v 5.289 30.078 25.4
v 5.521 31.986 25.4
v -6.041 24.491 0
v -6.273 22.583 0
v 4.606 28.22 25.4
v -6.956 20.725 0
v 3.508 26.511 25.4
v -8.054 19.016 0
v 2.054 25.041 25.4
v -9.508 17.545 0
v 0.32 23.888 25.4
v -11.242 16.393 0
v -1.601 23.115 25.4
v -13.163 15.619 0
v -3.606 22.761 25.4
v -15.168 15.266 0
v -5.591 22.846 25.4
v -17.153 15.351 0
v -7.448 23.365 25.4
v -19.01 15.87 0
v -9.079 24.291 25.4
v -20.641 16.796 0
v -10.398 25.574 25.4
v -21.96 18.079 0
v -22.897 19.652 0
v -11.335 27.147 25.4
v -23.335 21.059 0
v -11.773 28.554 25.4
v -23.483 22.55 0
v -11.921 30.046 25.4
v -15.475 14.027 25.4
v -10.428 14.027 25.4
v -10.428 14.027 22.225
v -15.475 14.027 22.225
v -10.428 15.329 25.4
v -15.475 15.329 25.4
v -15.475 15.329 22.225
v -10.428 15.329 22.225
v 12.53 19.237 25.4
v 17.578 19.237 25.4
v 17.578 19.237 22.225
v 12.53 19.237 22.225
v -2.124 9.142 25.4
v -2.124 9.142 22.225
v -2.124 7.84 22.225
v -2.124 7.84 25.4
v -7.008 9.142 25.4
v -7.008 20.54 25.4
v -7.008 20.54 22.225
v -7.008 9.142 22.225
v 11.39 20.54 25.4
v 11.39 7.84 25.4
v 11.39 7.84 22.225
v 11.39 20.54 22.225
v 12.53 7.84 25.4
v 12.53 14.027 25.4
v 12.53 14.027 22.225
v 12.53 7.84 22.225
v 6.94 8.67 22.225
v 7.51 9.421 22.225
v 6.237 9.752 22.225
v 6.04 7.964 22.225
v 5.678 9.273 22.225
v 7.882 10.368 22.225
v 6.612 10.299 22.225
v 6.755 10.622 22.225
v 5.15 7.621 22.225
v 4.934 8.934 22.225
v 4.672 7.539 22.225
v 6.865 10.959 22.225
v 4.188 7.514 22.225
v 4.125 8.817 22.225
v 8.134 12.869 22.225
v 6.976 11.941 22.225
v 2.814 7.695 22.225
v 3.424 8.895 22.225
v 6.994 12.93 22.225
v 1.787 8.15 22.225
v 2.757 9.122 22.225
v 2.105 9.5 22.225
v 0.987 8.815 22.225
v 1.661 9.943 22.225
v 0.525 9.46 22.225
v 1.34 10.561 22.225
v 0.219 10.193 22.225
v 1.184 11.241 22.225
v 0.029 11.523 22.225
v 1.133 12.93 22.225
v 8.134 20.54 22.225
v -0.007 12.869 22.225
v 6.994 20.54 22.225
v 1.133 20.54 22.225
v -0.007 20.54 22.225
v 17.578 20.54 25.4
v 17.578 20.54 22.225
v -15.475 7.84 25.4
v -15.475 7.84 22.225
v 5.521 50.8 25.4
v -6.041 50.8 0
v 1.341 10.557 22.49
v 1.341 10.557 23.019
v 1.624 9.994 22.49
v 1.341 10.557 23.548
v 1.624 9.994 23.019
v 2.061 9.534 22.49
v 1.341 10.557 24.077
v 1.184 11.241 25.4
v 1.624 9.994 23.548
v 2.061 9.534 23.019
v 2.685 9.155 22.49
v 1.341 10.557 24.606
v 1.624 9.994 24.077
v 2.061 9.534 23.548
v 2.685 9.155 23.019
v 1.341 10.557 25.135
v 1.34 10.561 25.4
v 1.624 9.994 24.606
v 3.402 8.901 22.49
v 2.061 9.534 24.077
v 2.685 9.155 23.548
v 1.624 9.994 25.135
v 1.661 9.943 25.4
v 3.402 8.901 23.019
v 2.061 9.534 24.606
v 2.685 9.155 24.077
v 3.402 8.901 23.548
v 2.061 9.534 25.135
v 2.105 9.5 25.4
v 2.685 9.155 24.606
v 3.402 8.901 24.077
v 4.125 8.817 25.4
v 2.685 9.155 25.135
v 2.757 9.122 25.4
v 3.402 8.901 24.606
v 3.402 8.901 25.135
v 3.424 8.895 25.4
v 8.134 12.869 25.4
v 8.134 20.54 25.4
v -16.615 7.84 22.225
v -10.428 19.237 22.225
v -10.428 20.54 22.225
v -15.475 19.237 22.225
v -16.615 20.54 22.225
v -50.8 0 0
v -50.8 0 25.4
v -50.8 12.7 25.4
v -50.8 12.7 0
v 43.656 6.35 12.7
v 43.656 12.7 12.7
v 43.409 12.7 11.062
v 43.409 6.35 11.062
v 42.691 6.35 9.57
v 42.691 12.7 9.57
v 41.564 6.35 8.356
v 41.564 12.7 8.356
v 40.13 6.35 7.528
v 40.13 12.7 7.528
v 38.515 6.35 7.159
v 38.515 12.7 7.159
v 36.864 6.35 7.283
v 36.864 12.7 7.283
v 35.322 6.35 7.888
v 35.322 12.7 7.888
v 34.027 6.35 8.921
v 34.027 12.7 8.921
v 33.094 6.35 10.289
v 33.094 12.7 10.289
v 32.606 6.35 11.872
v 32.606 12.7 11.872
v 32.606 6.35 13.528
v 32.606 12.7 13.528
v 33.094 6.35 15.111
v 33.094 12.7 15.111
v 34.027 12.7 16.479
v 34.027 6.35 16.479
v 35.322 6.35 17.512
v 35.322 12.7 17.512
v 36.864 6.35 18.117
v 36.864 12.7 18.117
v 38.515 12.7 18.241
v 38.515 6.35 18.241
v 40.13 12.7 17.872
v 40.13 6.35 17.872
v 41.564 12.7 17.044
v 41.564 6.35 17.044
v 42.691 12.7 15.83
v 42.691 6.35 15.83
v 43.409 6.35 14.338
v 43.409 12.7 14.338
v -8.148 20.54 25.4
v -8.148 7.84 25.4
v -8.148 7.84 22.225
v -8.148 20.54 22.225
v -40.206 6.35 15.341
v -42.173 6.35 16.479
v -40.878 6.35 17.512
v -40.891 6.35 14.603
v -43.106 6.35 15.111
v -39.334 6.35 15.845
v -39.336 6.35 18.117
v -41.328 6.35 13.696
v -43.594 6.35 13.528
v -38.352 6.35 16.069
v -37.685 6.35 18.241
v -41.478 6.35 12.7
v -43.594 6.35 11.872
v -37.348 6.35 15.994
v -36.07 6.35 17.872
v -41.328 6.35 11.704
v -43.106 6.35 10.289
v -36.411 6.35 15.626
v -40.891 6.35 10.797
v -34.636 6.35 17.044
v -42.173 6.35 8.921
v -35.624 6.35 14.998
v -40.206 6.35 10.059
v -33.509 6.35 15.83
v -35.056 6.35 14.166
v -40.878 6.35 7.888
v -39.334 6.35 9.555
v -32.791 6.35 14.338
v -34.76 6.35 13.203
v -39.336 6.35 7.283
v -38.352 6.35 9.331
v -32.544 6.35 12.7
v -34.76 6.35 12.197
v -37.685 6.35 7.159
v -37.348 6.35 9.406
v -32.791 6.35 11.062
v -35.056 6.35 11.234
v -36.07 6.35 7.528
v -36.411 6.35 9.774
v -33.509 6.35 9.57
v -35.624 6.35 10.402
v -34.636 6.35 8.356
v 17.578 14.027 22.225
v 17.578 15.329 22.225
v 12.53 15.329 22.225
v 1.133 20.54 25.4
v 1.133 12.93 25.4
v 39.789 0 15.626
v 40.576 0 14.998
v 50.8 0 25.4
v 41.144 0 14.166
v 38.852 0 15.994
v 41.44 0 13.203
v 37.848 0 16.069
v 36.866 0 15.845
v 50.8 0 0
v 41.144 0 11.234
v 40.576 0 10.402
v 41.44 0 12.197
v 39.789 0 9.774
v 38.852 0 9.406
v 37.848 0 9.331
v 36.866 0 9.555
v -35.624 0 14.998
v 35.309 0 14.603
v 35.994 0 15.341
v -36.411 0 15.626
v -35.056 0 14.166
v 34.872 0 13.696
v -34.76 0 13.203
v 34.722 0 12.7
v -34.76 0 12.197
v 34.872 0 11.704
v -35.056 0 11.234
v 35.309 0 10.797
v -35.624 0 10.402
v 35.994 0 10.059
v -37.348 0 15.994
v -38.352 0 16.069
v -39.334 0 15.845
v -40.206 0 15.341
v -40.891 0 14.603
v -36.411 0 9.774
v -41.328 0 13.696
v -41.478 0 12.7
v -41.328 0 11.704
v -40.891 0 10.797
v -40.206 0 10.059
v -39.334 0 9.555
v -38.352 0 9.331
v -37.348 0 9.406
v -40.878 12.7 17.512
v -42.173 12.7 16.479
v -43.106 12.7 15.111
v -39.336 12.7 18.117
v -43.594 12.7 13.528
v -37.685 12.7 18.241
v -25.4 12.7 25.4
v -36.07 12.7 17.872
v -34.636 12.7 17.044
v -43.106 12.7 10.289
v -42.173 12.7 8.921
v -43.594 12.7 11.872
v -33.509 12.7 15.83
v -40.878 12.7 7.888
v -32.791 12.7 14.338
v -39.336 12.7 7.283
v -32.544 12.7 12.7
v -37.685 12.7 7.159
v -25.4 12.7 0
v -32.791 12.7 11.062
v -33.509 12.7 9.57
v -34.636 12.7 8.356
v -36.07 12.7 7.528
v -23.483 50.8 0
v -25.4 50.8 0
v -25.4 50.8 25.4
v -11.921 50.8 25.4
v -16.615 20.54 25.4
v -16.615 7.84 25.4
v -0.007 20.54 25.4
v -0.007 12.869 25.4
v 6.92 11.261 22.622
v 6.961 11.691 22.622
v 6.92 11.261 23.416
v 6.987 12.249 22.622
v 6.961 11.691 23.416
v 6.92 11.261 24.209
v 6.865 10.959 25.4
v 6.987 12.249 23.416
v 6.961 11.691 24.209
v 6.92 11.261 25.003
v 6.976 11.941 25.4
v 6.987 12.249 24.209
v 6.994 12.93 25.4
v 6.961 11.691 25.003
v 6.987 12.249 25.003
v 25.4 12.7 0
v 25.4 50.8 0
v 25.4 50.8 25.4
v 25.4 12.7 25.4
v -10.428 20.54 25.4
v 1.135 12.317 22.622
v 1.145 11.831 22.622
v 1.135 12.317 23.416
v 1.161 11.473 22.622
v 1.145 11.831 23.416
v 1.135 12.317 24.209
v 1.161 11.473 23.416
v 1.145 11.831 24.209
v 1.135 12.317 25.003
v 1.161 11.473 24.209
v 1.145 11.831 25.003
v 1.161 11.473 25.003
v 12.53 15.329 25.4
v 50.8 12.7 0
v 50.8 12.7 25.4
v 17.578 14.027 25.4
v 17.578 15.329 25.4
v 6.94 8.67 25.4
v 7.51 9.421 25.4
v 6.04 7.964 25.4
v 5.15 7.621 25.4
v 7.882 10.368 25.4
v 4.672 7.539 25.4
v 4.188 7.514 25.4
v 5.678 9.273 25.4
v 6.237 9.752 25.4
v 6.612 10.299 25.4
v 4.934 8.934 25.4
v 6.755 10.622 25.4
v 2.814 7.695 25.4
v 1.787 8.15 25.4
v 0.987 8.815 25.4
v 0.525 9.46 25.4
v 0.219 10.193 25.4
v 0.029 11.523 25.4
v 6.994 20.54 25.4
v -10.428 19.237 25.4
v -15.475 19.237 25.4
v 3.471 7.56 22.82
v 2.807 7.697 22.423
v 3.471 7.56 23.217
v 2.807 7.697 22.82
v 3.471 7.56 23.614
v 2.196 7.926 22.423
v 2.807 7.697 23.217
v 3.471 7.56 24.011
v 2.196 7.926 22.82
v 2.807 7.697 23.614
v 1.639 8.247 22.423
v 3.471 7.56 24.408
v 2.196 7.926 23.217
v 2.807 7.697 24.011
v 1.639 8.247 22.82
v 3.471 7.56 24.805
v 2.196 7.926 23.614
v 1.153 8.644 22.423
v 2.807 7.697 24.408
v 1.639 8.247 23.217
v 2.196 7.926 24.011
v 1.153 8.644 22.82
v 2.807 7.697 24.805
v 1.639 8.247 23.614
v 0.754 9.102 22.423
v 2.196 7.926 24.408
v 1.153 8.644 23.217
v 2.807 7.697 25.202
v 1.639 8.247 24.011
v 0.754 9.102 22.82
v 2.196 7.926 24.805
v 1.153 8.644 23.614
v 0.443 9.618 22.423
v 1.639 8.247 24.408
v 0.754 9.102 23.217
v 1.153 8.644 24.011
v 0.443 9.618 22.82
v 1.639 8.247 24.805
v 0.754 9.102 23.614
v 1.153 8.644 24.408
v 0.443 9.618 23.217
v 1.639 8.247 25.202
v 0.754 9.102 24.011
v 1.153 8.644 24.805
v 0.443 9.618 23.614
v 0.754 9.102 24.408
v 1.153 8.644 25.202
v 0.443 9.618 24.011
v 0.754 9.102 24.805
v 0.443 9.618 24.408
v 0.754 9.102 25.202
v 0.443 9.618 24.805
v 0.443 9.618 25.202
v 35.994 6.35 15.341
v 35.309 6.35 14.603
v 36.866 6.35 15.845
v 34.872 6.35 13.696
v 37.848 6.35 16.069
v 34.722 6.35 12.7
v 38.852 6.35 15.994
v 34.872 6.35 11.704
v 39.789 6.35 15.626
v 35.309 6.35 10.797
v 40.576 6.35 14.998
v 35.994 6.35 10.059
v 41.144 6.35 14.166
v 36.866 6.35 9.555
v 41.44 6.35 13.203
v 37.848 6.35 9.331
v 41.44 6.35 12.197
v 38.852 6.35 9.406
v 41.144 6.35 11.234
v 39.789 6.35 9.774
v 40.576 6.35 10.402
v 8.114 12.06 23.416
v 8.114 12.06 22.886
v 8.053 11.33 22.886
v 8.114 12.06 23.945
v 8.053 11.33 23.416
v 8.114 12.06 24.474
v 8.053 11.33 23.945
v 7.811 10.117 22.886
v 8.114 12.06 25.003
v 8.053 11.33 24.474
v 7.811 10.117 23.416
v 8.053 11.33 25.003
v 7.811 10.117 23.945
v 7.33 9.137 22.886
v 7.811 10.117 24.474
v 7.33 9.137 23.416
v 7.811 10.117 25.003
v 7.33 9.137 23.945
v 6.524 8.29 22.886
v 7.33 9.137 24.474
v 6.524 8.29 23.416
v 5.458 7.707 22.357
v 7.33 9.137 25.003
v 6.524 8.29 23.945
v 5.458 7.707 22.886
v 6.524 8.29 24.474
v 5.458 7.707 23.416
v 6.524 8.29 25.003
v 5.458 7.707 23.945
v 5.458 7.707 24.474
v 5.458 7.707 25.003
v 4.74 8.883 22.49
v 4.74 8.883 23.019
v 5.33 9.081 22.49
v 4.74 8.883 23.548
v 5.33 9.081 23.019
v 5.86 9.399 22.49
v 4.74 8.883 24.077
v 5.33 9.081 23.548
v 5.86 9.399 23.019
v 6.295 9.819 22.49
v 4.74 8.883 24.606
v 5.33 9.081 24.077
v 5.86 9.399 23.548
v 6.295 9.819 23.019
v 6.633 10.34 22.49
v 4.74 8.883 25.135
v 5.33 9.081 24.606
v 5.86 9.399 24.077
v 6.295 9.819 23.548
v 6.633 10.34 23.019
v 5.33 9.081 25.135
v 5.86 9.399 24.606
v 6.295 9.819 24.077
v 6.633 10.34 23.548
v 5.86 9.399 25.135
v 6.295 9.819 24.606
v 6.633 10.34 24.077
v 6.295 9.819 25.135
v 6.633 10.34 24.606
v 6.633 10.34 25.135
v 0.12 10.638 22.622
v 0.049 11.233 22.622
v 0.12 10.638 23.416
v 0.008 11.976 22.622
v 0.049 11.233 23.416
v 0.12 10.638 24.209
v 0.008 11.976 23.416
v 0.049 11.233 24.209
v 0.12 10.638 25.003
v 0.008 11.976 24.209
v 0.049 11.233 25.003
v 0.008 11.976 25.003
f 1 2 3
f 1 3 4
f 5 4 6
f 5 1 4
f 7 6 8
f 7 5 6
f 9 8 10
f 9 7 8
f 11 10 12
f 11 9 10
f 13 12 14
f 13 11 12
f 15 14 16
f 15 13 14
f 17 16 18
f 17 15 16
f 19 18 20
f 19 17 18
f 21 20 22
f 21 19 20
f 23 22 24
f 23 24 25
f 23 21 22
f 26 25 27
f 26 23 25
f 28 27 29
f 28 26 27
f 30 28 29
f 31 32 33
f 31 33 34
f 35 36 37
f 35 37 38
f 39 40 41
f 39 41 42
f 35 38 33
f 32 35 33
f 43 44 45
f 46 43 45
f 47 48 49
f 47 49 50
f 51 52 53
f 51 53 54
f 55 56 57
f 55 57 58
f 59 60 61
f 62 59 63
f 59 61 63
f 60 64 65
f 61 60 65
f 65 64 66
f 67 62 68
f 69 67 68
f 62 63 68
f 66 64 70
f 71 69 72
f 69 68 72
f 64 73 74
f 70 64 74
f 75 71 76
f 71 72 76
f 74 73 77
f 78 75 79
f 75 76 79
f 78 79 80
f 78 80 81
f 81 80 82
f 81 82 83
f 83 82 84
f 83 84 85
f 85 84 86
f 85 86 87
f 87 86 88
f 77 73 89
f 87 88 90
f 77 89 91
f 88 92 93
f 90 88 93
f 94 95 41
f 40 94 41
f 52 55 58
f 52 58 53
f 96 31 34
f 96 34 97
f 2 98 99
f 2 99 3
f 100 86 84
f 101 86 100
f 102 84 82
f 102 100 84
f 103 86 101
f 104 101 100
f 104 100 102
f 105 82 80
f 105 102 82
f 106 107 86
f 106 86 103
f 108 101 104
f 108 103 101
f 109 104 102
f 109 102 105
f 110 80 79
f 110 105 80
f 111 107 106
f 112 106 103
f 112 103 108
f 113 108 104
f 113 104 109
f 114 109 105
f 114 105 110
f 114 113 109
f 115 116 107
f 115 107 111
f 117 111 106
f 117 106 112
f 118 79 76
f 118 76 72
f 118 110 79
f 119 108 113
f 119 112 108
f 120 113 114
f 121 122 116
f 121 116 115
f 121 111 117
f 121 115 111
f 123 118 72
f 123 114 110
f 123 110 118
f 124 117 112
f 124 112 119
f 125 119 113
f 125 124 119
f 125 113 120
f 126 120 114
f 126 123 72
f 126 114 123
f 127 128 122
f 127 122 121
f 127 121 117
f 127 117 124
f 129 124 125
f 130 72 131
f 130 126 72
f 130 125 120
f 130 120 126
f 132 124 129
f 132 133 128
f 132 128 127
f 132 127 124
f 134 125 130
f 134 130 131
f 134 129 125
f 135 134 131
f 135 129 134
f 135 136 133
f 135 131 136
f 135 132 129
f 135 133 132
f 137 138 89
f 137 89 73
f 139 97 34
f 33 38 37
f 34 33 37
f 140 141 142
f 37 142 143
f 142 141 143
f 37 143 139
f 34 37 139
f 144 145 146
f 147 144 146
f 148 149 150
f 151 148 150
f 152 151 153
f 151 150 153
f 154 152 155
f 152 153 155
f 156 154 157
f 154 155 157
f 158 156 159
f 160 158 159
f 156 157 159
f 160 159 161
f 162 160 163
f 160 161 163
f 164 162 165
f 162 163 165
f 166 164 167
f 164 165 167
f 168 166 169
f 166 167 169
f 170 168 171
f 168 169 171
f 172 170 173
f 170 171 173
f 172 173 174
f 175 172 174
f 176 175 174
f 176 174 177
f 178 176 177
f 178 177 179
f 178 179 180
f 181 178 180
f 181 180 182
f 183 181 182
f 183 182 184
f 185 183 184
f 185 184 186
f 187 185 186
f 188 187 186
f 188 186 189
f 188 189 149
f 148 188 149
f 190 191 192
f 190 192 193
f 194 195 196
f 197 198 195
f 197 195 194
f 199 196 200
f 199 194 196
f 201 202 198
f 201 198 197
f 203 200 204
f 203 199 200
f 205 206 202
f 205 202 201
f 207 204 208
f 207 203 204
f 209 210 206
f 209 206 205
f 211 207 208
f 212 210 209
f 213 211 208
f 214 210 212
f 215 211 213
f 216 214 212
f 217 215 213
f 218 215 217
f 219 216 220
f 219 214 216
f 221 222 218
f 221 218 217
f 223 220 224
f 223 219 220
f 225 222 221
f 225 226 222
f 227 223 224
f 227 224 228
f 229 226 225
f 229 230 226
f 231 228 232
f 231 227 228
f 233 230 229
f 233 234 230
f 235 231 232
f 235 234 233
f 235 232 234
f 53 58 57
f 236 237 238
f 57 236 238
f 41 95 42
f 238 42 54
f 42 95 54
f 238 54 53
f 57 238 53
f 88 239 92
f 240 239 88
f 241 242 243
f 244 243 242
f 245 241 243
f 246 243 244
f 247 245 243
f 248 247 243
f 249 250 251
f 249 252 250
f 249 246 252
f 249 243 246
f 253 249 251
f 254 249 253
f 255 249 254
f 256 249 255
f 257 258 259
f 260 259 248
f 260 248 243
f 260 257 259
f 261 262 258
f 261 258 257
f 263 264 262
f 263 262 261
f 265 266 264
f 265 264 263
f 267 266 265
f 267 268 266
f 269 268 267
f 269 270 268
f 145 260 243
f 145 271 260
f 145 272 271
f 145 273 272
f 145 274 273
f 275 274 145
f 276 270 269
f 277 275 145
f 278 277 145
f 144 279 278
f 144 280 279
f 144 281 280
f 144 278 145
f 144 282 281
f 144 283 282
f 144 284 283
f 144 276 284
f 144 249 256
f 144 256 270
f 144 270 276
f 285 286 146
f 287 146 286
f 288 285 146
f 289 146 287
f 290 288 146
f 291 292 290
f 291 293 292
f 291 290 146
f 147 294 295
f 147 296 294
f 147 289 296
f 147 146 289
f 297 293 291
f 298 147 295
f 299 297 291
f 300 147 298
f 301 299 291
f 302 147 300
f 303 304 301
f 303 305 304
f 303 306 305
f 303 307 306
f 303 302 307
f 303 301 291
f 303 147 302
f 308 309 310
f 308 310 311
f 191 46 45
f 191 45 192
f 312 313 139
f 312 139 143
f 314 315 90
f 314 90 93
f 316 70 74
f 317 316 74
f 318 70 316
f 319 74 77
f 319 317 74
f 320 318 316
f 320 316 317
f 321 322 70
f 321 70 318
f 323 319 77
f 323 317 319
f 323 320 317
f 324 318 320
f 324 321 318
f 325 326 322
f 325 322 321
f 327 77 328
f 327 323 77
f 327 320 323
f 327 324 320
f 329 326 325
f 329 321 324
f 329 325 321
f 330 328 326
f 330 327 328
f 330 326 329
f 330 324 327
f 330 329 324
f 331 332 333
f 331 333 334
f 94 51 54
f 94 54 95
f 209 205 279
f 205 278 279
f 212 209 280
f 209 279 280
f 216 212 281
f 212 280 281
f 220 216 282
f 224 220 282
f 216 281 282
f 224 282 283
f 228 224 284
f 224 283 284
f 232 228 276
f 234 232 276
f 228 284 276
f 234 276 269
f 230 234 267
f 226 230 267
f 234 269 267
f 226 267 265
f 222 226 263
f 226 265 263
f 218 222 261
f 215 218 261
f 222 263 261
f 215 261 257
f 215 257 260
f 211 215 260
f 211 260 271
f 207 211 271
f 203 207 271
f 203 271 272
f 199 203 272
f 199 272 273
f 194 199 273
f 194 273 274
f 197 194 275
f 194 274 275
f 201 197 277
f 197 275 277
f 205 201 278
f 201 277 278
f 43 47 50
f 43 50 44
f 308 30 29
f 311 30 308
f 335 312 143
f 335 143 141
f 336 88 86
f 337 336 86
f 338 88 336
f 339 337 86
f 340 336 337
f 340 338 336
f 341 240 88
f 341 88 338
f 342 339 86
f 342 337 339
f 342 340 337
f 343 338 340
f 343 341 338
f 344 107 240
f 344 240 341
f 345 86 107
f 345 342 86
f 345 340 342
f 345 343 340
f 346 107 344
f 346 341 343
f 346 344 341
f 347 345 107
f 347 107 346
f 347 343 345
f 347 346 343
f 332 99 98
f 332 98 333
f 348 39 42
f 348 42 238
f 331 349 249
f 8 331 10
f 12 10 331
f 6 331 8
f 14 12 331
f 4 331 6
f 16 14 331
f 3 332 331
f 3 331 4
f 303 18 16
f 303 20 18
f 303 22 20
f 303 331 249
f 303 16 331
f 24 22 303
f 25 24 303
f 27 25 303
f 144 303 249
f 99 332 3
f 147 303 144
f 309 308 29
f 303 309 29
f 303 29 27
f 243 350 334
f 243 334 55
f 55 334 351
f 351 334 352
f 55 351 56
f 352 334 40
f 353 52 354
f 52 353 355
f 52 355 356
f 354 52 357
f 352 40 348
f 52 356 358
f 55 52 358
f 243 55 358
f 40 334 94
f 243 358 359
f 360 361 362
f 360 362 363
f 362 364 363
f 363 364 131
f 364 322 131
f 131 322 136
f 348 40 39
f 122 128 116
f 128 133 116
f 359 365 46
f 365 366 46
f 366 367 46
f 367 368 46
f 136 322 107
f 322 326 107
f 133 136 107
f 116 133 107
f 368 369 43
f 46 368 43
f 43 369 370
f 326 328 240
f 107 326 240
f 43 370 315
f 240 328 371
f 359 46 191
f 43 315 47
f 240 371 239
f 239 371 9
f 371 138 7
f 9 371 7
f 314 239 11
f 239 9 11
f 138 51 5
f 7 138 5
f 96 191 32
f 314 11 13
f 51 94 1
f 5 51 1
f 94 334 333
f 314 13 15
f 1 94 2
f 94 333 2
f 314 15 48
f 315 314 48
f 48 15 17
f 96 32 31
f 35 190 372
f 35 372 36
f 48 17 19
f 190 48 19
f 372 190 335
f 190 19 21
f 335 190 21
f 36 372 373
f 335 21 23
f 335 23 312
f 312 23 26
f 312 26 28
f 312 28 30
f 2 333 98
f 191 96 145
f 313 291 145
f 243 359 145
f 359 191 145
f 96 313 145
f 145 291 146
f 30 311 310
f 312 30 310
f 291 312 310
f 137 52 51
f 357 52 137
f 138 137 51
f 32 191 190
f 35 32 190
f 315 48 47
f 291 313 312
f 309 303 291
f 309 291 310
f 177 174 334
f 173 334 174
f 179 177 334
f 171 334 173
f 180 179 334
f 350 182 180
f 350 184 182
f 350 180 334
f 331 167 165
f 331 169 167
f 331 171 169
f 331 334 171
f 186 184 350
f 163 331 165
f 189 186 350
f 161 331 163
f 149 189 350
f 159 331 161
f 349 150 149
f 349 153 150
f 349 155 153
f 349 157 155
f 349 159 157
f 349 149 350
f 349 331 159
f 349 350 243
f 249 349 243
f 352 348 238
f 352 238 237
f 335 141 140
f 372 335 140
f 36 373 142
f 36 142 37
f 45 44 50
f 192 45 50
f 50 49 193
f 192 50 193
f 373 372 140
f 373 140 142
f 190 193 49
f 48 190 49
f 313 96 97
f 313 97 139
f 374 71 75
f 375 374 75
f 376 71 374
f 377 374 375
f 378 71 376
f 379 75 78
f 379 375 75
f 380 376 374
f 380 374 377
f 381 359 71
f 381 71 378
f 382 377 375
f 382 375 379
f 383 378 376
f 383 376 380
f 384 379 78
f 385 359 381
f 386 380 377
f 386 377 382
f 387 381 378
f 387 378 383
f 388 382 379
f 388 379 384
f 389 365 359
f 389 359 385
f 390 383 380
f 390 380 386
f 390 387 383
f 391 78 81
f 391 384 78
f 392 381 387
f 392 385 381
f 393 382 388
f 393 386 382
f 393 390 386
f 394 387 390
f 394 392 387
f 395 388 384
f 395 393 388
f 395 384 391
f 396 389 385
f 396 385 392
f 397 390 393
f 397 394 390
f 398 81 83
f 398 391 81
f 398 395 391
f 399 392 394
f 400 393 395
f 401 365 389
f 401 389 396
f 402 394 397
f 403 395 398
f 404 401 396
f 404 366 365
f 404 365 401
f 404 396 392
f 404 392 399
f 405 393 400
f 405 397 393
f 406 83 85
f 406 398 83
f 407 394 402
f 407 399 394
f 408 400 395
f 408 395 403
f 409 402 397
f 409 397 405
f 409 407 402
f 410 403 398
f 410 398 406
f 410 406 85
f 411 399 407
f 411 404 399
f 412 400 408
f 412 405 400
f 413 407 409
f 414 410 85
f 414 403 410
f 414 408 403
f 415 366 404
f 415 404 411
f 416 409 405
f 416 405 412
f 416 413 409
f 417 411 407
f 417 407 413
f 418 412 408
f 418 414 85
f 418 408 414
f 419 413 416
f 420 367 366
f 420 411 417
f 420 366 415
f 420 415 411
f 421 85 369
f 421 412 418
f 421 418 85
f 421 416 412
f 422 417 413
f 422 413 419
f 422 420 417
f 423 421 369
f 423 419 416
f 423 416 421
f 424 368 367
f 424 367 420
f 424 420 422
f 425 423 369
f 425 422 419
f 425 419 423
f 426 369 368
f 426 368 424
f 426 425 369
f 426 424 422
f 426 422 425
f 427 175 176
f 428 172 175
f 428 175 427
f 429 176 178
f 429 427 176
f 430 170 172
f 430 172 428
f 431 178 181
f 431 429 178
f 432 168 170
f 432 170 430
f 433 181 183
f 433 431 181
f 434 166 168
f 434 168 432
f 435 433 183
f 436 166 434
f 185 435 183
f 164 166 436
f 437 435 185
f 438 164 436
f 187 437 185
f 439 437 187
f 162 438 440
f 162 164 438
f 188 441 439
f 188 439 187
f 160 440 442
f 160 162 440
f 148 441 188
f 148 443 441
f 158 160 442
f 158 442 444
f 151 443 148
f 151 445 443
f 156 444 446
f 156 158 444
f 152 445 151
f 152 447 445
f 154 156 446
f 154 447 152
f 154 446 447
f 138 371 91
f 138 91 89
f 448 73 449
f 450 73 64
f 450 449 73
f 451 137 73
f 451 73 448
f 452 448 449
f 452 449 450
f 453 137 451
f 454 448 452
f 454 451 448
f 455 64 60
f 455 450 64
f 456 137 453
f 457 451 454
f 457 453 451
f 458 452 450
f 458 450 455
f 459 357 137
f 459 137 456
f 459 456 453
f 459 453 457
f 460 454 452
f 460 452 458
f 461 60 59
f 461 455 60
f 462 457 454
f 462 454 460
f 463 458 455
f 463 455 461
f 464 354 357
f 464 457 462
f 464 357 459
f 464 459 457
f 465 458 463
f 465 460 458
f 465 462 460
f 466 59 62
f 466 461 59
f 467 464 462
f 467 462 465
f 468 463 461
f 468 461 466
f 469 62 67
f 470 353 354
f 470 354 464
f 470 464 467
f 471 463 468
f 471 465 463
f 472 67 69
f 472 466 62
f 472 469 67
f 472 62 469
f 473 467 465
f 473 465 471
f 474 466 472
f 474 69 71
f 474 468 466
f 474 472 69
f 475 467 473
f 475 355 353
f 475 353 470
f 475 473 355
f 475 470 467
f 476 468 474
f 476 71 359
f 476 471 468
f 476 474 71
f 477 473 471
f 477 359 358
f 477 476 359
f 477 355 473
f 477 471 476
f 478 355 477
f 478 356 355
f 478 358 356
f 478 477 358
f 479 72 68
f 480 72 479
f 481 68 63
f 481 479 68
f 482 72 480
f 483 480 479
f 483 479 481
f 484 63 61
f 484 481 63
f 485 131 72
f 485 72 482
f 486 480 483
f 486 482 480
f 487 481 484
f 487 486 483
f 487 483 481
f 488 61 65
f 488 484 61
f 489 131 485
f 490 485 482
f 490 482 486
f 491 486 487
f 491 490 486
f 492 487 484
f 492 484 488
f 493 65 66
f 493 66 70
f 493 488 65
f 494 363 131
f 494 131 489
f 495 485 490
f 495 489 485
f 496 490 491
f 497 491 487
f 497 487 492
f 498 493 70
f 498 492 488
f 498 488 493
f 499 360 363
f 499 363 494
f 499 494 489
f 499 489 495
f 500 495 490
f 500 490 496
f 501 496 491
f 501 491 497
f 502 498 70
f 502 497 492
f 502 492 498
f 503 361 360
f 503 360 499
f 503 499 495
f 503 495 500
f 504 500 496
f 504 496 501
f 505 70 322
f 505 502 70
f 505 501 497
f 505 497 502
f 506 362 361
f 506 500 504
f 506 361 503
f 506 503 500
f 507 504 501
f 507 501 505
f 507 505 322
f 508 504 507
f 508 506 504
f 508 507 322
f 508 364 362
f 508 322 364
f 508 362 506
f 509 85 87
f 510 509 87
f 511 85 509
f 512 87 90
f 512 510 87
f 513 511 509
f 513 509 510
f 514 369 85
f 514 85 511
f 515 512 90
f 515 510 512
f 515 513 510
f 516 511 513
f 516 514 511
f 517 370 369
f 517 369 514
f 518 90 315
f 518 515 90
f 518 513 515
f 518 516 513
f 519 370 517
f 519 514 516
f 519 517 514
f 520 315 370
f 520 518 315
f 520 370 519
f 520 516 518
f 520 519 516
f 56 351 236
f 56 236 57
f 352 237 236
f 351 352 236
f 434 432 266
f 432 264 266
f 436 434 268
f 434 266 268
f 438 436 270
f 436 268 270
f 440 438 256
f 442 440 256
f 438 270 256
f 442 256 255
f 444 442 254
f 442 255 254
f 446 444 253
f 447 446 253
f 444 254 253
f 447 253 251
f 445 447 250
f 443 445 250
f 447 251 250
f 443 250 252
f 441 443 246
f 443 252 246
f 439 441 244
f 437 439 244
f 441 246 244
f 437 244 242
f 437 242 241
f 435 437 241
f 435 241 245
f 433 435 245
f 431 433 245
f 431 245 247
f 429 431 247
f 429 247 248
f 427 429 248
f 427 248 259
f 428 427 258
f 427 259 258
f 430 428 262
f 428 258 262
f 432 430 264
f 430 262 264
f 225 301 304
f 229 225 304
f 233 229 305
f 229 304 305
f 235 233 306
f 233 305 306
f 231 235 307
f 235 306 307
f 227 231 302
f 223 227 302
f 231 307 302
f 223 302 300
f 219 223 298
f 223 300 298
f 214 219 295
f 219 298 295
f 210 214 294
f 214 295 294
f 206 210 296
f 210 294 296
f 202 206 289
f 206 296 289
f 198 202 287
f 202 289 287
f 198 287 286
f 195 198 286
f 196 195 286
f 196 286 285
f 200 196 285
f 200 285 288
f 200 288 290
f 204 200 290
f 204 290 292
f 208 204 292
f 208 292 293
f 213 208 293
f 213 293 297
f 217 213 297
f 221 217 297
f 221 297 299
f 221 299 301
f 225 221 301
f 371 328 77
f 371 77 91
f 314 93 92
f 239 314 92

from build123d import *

# Parameters (mm, degrees)
BOSS_EXTRUDE1_DEPTH                              = 25.4
CBORE_FOR_1_4_SOCKET_HEAD_CAP_SCREW1_D           = 6.7564
CBORE_FOR_1_4_SOCKET_HEAD_CAP_SCREW1_CBORE_D     = 11.1125
CBORE_FOR_1_4_SOCKET_HEAD_CAP_SCREW1_CBORE_DEPTH = 6.35
SKETCH6_R                                        = 7.9375
CUT_EXTRUDE2_DEPTH                               = 88.530033839
CUT_EXTRUDE3_DEPTH                               = 3.175


with BuildPart() as part:
    # Sketch1 → Boss-Extrude1 (new body)
    with BuildSketch(Plane.XY):
        Polygon((25.4, 12.7), (50.8, 12.7), (50.8, 0), (-50.8, 0), (-50.8, 12.7), (-25.4, 12.7), (-25.4, 50.8), (25.4, 50.8), align=None)
    extrude(amount=BOSS_EXTRUDE1_DEPTH)

    # CBORE for 1/4 Socket Head Cap Screw1 (through all)
    with Locations(Plane(origin=(0, 12.7, 0), x_dir=(1, 0, 0), z_dir=(0, 1, 0))):
        with Locations((-38.1, -12.7), (38.1, -12.7)):
            CounterBoreHole(CBORE_FOR_1_4_SOCKET_HEAD_CAP_SCREW1_D / 2, CBORE_FOR_1_4_SOCKET_HEAD_CAP_SCREW1_CBORE_D / 2, CBORE_FOR_1_4_SOCKET_HEAD_CAP_SCREW1_CBORE_DEPTH)

    # Sketch6 → Cut-Extrude2 (cut, through all)
    with BuildSketch(Plane(origin=(8.61013147, 38.672281651, 51.345863849), x_dir=(-0.9161407044196058, 0.08766347581543056, 0.39115383765662576), z_dir=(-0.40011338654688333, -0.2593820230581922, -0.878993881673942))):
        Circle(SKETCH6_R)
        with BuildLine():
            Line((-4.081369276, 42.668005296), (-7.904732998, 0.720487673))
            ThreePointArc((-7.904732998, 0.720487673), (0.360616196, 7.929304018), (7.9375, 0))
            ThreePointArc((7.9375, 0), (7.929304018, -0.360616196), (7.904732998, -0.720487673))
            Line((7.904732998, -0.720487673), (11.728096719, 41.227029949))
            Line((11.728096719, 41.227029949), (-4.081369276, 42.668005296))
        make_face()
    extrude(amount=CUT_EXTRUDE2_DEPTH, mode=Mode.SUBTRACT)

    # Sketch7 → Cut-Extrude3 (cut)
    with BuildSketch(Plane.XY.offset(25.4)):
        Polygon((-16.614726636, 20.539659198), (-10.427547149, 20.539659198), (-10.427547149, 19.237095095), (-15.474983047, 19.237095095), (-15.474983047, 15.329402787), (-10.427547149, 15.329402787), (-10.427547149, 14.026838685), (-15.474983047, 14.026838685), (-15.474983047, 7.839659198), (-16.614726636, 7.839659198), align=None)
        Polygon((-8.14805997, 20.539659198), (-7.00831638, 20.539659198), (-7.00831638, 9.1422233), (-2.123700995, 9.1422233), (-2.123700995, 7.839659198), (-8.14805997, 7.839659198), align=None)
        with BuildLine():
            Line((-0.007034329, 20.539659198), (1.132709261, 20.539659198))
            Line((1.132709261, 20.539659198), (1.132709261, 12.930344294))
            add(Edge.make_bspline(
                [(1.132709261, 12.930344294), (1.132539647, 12.822645624), (1.132217776, 12.618268839), (1.134367755, 12.327372434), (1.140388891, 12.068755225), (1.144184956, 11.841420336), (1.152629852, 11.646410938), (1.159517051, 11.482670525), (1.168372785, 11.350974419), (1.179015812, 11.274117916), (1.183590671, 11.241081473)],
                knots=[0, 0, 0, 0, 1.528628734, 2.90083645, 4.128790002, 5.200304208, 6.127813768, 6.898992206, 7.526736466, 8, 8, 8, 8], degree=3))
            add(Edge.make_bspline(
                [(1.183590671, 11.241081473), (1.20237745, 11.121894646), (1.238892441, 10.890236743), (1.331952154, 10.560369549), (1.461918515, 10.263075401), (1.615926127, 9.989077287), (1.818881603, 9.746001609), (2.062008717, 9.522076469), (2.356568048, 9.326235921), (2.684085103, 9.147162975), (3.037091536, 9.003235391), (3.397812417, 8.894402326), (3.760825513, 8.828076032), (4.003853312, 8.820396019), (4.124536184, 8.816582275)],
                knots=[0, 0, 0, 0, 1.035780045, 2.013197591, 2.933192213, 3.817615948, 4.702609284, 5.640816605, 6.646850145, 7.73207398, 8.84249596, 9.914020372, 10.964143139, 12, 12, 12, 12], degree=3))
            add(Edge.make_bspline(
                [(4.124536184, 8.816582275), (4.228145471, 8.820478817), (4.434765624, 8.828249397), (4.741766101, 8.876369446), (5.040760781, 8.963094356), (5.333226105, 9.074998622), (5.607368249, 9.222854167), (5.863340167, 9.39365407), (6.0918093, 9.593990678), (6.300299749, 9.815697642), (6.481855087, 10.065850631), (6.639230373, 10.339002731), (6.768138746, 10.639264647), (6.831796679, 10.850282122), (6.864500126, 10.958689646)],
                knots=[0, 0, 0, 0, 0.994687771, 1.983630487, 2.973142513, 3.978332533, 4.983357753, 5.956394766, 6.925816176, 7.893390482, 8.871859704, 9.88551698, 10.913711441, 12, 12, 12, 12], degree=3))
            add(Edge.make_bspline(
                [(6.864500126, 10.958689646), (6.875386295, 11.00349733), (6.899645067, 11.103346908), (6.922312916, 11.272152734), (6.945922308, 11.471322711), (6.962303748, 11.702287861), (6.97827389, 11.964274247), (6.987828183, 12.258646667), (6.992244274, 12.584336211), (6.993560286, 12.811619626), (6.994247723, 12.930344294)],
                knots=[0, 0, 0, 0, 0.558680831, 1.244966039, 2.062412453, 2.990489873, 4.051219941, 5.244515665, 6.560634259, 8, 8, 8, 8], degree=3))
            Line((6.994247723, 12.930344294), (6.994247723, 20.539659198))
            Line((6.994247723, 20.539659198), (8.133991312, 20.539659198))
            Line((8.133991312, 20.539659198), (8.133991312, 12.869286602))
            add(Edge.make_bspline(
                [(8.133991312, 12.869286602), (8.133069218, 12.731043912), (8.131269696, 12.461254899), (8.115664747, 12.06591711), (8.090783633, 11.690893435), (8.055629714, 11.336133462), (8.009049731, 11.002906656), (7.957251074, 10.688292211), (7.89128534, 10.394548495), (7.814238427, 10.119385151), (7.726160124, 9.85745486), (7.612073671, 9.608866458), (7.483533343, 9.366062779), (7.331080174, 9.132716213), (7.1597703, 8.907793577), (6.965817058, 8.692658933), (6.755635103, 8.483874394), (6.525730415, 8.286795554), (6.279892795, 8.106061212), (6.01885352, 7.947137871), (5.744617813, 7.812795031), (5.457898526, 7.702210962), (5.158573304, 7.619063702), (4.846634599, 7.55710528), (4.521372383, 7.5218998), (4.300157774, 7.516667654), (4.188137947, 7.514018172)],
                knots=[0, 0, 0, 0, 1.316592851, 2.569410997, 3.76748051, 4.895814652, 5.963796859, 6.97159953, 7.931736103, 8.829262218, 9.692595152, 10.560224239, 11.431080259, 12.30701507, 13.211635791, 14.121146779, 15.063487852, 16.031507147, 17.00238618, 17.966455255, 18.938106653, 19.907068911, 20.888905087, 21.893141452, 22.933117798, 24, 24, 24, 24], degree=3))
            add(Edge.make_bspline(
                [(4.188137947, 7.514018172), (4.065967203, 7.516865749), (3.826268641, 7.522452684), (3.473070511, 7.554466663), (3.134473285, 7.614767694), (2.806900816, 7.691548061), (2.494812841, 7.797443337), (2.194028057, 7.921170818), (1.909697986, 8.073125449), (1.637209948, 8.242192903), (1.383845832, 8.432419447), (1.151263827, 8.63975665), (0.939079954, 8.860883162), (0.750870684, 9.098193061), (0.58351776, 9.349840684), (0.439353843, 9.616537925), (0.3155715, 9.898181529), (0.251684814, 10.093954571), (0.219387947, 10.192924422)],
                knots=[0, 0, 0, 0, 1.13879206, 2.234305948, 3.301075583, 4.341971843, 5.366689343, 6.369221514, 7.369726634, 8.367512178, 9.355451585, 10.318319045, 11.268648973, 12.207971039, 13.137398894, 14.081662264, 15.030215811, 16, 16, 16, 16], degree=3))
            add(Edge.make_bspline(
                [(0.219387947, 10.192924422), (0.200602259, 10.260534049), (0.159855683, 10.407180837), (0.116221031, 10.649883238), (0.079539506, 10.929337368), (0.045047909, 11.245562354), (0.024695405, 11.598803299), (0.006852127, 11.988907079), (-0.007160032, 12.416345397), (-0.007077401, 12.714086068), (-0.007034329, 12.869286602)],
                knots=[0, 0, 0, 0, 0.625038921, 1.35572334, 2.194682327, 3.136881307, 4.189498639, 5.346923369, 6.617055217, 8, 8, 8, 8], degree=3))
            Line((-0.007034329, 12.869286602), (-0.007034329, 20.539659198))
        make_face()
        Polygon((11.390401569, 20.539659198), (17.577581056, 20.539659198), (17.577581056, 19.237095095), (12.530145158, 19.237095095), (12.530145158, 15.329402787), (17.577581056, 15.329402787), (17.577581056, 14.026838685), (12.530145158, 14.026838685), (12.530145158, 7.839659198), (11.390401569, 7.839659198), align=None)
    extrude(amount=-CUT_EXTRUDE3_DEPTH, mode=Mode.SUBTRACT)


solid = part.part
